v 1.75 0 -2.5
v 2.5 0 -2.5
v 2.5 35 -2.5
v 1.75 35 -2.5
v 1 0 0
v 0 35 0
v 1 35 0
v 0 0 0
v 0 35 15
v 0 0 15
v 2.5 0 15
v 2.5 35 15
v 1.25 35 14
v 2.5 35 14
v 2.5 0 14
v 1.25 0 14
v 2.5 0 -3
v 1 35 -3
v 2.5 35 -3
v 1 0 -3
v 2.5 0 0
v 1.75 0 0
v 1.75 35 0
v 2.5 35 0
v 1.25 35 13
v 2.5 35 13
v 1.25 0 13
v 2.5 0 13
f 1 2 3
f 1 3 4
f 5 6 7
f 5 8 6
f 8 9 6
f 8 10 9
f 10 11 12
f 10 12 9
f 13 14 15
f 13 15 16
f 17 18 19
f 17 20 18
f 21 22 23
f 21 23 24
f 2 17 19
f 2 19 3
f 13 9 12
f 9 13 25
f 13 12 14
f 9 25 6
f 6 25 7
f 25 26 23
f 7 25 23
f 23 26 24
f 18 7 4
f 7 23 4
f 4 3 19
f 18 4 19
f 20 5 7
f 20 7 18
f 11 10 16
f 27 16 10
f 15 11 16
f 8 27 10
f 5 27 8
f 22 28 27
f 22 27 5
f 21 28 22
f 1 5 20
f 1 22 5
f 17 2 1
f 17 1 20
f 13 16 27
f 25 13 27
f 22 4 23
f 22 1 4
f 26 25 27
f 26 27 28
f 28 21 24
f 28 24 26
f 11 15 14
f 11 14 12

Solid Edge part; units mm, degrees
sketch "Sketch1" plane through (0, 0, 0) normal (0, -1, 0) x (1, 0, 0)
  line L0 (2.5, 0) -> (2.5, 15)
  line L1 (2.5, 15) -> (0, 15)
  line L2 (0, 15) -> (0, 0)
  line L3 (0, 0) -> (2.5, 0)
extrude "Protrusion1" add sketch "Sketch1" against normal blind 35
sketch "Sketch2" plane through (1.25, 0, 7.5) normal (0, -1, 0) x (0, 0, 1)
  line L0 (6.5, -1.25) -> (6.5, 0)
  line L1 (6.5, 0) -> (5.5, 0)
  line L2 (5.5, 0) -> (5.5, -1.25)
  line L3 (6.5, -1.25) -> (5.5, -1.25)
extrude "Vyříznutí_1" cut sketch "Sketch2" against normal blind 35
sketch "Sketch3" plane through (1.25, 0, 7.5) normal (0, -1, 0) x (0, 0, -1)
  line L0 (7.5, -0.25) -> (7.5, 0.5)
  line L1 (10, 0.5) -> (7.5, 0.5)
  line L2 (10, 1.25) -> (10, 0.5)
  line L3 (10.5, 1.25) -> (10, 1.25)
  line L4 (10.5, -0.25) -> (10.5, 1.25)
  line L5 (7.5, -0.25) -> (10.5, -0.25)
extrude "Vysunutí_2" add sketch "Sketch3" against normal blind 35
